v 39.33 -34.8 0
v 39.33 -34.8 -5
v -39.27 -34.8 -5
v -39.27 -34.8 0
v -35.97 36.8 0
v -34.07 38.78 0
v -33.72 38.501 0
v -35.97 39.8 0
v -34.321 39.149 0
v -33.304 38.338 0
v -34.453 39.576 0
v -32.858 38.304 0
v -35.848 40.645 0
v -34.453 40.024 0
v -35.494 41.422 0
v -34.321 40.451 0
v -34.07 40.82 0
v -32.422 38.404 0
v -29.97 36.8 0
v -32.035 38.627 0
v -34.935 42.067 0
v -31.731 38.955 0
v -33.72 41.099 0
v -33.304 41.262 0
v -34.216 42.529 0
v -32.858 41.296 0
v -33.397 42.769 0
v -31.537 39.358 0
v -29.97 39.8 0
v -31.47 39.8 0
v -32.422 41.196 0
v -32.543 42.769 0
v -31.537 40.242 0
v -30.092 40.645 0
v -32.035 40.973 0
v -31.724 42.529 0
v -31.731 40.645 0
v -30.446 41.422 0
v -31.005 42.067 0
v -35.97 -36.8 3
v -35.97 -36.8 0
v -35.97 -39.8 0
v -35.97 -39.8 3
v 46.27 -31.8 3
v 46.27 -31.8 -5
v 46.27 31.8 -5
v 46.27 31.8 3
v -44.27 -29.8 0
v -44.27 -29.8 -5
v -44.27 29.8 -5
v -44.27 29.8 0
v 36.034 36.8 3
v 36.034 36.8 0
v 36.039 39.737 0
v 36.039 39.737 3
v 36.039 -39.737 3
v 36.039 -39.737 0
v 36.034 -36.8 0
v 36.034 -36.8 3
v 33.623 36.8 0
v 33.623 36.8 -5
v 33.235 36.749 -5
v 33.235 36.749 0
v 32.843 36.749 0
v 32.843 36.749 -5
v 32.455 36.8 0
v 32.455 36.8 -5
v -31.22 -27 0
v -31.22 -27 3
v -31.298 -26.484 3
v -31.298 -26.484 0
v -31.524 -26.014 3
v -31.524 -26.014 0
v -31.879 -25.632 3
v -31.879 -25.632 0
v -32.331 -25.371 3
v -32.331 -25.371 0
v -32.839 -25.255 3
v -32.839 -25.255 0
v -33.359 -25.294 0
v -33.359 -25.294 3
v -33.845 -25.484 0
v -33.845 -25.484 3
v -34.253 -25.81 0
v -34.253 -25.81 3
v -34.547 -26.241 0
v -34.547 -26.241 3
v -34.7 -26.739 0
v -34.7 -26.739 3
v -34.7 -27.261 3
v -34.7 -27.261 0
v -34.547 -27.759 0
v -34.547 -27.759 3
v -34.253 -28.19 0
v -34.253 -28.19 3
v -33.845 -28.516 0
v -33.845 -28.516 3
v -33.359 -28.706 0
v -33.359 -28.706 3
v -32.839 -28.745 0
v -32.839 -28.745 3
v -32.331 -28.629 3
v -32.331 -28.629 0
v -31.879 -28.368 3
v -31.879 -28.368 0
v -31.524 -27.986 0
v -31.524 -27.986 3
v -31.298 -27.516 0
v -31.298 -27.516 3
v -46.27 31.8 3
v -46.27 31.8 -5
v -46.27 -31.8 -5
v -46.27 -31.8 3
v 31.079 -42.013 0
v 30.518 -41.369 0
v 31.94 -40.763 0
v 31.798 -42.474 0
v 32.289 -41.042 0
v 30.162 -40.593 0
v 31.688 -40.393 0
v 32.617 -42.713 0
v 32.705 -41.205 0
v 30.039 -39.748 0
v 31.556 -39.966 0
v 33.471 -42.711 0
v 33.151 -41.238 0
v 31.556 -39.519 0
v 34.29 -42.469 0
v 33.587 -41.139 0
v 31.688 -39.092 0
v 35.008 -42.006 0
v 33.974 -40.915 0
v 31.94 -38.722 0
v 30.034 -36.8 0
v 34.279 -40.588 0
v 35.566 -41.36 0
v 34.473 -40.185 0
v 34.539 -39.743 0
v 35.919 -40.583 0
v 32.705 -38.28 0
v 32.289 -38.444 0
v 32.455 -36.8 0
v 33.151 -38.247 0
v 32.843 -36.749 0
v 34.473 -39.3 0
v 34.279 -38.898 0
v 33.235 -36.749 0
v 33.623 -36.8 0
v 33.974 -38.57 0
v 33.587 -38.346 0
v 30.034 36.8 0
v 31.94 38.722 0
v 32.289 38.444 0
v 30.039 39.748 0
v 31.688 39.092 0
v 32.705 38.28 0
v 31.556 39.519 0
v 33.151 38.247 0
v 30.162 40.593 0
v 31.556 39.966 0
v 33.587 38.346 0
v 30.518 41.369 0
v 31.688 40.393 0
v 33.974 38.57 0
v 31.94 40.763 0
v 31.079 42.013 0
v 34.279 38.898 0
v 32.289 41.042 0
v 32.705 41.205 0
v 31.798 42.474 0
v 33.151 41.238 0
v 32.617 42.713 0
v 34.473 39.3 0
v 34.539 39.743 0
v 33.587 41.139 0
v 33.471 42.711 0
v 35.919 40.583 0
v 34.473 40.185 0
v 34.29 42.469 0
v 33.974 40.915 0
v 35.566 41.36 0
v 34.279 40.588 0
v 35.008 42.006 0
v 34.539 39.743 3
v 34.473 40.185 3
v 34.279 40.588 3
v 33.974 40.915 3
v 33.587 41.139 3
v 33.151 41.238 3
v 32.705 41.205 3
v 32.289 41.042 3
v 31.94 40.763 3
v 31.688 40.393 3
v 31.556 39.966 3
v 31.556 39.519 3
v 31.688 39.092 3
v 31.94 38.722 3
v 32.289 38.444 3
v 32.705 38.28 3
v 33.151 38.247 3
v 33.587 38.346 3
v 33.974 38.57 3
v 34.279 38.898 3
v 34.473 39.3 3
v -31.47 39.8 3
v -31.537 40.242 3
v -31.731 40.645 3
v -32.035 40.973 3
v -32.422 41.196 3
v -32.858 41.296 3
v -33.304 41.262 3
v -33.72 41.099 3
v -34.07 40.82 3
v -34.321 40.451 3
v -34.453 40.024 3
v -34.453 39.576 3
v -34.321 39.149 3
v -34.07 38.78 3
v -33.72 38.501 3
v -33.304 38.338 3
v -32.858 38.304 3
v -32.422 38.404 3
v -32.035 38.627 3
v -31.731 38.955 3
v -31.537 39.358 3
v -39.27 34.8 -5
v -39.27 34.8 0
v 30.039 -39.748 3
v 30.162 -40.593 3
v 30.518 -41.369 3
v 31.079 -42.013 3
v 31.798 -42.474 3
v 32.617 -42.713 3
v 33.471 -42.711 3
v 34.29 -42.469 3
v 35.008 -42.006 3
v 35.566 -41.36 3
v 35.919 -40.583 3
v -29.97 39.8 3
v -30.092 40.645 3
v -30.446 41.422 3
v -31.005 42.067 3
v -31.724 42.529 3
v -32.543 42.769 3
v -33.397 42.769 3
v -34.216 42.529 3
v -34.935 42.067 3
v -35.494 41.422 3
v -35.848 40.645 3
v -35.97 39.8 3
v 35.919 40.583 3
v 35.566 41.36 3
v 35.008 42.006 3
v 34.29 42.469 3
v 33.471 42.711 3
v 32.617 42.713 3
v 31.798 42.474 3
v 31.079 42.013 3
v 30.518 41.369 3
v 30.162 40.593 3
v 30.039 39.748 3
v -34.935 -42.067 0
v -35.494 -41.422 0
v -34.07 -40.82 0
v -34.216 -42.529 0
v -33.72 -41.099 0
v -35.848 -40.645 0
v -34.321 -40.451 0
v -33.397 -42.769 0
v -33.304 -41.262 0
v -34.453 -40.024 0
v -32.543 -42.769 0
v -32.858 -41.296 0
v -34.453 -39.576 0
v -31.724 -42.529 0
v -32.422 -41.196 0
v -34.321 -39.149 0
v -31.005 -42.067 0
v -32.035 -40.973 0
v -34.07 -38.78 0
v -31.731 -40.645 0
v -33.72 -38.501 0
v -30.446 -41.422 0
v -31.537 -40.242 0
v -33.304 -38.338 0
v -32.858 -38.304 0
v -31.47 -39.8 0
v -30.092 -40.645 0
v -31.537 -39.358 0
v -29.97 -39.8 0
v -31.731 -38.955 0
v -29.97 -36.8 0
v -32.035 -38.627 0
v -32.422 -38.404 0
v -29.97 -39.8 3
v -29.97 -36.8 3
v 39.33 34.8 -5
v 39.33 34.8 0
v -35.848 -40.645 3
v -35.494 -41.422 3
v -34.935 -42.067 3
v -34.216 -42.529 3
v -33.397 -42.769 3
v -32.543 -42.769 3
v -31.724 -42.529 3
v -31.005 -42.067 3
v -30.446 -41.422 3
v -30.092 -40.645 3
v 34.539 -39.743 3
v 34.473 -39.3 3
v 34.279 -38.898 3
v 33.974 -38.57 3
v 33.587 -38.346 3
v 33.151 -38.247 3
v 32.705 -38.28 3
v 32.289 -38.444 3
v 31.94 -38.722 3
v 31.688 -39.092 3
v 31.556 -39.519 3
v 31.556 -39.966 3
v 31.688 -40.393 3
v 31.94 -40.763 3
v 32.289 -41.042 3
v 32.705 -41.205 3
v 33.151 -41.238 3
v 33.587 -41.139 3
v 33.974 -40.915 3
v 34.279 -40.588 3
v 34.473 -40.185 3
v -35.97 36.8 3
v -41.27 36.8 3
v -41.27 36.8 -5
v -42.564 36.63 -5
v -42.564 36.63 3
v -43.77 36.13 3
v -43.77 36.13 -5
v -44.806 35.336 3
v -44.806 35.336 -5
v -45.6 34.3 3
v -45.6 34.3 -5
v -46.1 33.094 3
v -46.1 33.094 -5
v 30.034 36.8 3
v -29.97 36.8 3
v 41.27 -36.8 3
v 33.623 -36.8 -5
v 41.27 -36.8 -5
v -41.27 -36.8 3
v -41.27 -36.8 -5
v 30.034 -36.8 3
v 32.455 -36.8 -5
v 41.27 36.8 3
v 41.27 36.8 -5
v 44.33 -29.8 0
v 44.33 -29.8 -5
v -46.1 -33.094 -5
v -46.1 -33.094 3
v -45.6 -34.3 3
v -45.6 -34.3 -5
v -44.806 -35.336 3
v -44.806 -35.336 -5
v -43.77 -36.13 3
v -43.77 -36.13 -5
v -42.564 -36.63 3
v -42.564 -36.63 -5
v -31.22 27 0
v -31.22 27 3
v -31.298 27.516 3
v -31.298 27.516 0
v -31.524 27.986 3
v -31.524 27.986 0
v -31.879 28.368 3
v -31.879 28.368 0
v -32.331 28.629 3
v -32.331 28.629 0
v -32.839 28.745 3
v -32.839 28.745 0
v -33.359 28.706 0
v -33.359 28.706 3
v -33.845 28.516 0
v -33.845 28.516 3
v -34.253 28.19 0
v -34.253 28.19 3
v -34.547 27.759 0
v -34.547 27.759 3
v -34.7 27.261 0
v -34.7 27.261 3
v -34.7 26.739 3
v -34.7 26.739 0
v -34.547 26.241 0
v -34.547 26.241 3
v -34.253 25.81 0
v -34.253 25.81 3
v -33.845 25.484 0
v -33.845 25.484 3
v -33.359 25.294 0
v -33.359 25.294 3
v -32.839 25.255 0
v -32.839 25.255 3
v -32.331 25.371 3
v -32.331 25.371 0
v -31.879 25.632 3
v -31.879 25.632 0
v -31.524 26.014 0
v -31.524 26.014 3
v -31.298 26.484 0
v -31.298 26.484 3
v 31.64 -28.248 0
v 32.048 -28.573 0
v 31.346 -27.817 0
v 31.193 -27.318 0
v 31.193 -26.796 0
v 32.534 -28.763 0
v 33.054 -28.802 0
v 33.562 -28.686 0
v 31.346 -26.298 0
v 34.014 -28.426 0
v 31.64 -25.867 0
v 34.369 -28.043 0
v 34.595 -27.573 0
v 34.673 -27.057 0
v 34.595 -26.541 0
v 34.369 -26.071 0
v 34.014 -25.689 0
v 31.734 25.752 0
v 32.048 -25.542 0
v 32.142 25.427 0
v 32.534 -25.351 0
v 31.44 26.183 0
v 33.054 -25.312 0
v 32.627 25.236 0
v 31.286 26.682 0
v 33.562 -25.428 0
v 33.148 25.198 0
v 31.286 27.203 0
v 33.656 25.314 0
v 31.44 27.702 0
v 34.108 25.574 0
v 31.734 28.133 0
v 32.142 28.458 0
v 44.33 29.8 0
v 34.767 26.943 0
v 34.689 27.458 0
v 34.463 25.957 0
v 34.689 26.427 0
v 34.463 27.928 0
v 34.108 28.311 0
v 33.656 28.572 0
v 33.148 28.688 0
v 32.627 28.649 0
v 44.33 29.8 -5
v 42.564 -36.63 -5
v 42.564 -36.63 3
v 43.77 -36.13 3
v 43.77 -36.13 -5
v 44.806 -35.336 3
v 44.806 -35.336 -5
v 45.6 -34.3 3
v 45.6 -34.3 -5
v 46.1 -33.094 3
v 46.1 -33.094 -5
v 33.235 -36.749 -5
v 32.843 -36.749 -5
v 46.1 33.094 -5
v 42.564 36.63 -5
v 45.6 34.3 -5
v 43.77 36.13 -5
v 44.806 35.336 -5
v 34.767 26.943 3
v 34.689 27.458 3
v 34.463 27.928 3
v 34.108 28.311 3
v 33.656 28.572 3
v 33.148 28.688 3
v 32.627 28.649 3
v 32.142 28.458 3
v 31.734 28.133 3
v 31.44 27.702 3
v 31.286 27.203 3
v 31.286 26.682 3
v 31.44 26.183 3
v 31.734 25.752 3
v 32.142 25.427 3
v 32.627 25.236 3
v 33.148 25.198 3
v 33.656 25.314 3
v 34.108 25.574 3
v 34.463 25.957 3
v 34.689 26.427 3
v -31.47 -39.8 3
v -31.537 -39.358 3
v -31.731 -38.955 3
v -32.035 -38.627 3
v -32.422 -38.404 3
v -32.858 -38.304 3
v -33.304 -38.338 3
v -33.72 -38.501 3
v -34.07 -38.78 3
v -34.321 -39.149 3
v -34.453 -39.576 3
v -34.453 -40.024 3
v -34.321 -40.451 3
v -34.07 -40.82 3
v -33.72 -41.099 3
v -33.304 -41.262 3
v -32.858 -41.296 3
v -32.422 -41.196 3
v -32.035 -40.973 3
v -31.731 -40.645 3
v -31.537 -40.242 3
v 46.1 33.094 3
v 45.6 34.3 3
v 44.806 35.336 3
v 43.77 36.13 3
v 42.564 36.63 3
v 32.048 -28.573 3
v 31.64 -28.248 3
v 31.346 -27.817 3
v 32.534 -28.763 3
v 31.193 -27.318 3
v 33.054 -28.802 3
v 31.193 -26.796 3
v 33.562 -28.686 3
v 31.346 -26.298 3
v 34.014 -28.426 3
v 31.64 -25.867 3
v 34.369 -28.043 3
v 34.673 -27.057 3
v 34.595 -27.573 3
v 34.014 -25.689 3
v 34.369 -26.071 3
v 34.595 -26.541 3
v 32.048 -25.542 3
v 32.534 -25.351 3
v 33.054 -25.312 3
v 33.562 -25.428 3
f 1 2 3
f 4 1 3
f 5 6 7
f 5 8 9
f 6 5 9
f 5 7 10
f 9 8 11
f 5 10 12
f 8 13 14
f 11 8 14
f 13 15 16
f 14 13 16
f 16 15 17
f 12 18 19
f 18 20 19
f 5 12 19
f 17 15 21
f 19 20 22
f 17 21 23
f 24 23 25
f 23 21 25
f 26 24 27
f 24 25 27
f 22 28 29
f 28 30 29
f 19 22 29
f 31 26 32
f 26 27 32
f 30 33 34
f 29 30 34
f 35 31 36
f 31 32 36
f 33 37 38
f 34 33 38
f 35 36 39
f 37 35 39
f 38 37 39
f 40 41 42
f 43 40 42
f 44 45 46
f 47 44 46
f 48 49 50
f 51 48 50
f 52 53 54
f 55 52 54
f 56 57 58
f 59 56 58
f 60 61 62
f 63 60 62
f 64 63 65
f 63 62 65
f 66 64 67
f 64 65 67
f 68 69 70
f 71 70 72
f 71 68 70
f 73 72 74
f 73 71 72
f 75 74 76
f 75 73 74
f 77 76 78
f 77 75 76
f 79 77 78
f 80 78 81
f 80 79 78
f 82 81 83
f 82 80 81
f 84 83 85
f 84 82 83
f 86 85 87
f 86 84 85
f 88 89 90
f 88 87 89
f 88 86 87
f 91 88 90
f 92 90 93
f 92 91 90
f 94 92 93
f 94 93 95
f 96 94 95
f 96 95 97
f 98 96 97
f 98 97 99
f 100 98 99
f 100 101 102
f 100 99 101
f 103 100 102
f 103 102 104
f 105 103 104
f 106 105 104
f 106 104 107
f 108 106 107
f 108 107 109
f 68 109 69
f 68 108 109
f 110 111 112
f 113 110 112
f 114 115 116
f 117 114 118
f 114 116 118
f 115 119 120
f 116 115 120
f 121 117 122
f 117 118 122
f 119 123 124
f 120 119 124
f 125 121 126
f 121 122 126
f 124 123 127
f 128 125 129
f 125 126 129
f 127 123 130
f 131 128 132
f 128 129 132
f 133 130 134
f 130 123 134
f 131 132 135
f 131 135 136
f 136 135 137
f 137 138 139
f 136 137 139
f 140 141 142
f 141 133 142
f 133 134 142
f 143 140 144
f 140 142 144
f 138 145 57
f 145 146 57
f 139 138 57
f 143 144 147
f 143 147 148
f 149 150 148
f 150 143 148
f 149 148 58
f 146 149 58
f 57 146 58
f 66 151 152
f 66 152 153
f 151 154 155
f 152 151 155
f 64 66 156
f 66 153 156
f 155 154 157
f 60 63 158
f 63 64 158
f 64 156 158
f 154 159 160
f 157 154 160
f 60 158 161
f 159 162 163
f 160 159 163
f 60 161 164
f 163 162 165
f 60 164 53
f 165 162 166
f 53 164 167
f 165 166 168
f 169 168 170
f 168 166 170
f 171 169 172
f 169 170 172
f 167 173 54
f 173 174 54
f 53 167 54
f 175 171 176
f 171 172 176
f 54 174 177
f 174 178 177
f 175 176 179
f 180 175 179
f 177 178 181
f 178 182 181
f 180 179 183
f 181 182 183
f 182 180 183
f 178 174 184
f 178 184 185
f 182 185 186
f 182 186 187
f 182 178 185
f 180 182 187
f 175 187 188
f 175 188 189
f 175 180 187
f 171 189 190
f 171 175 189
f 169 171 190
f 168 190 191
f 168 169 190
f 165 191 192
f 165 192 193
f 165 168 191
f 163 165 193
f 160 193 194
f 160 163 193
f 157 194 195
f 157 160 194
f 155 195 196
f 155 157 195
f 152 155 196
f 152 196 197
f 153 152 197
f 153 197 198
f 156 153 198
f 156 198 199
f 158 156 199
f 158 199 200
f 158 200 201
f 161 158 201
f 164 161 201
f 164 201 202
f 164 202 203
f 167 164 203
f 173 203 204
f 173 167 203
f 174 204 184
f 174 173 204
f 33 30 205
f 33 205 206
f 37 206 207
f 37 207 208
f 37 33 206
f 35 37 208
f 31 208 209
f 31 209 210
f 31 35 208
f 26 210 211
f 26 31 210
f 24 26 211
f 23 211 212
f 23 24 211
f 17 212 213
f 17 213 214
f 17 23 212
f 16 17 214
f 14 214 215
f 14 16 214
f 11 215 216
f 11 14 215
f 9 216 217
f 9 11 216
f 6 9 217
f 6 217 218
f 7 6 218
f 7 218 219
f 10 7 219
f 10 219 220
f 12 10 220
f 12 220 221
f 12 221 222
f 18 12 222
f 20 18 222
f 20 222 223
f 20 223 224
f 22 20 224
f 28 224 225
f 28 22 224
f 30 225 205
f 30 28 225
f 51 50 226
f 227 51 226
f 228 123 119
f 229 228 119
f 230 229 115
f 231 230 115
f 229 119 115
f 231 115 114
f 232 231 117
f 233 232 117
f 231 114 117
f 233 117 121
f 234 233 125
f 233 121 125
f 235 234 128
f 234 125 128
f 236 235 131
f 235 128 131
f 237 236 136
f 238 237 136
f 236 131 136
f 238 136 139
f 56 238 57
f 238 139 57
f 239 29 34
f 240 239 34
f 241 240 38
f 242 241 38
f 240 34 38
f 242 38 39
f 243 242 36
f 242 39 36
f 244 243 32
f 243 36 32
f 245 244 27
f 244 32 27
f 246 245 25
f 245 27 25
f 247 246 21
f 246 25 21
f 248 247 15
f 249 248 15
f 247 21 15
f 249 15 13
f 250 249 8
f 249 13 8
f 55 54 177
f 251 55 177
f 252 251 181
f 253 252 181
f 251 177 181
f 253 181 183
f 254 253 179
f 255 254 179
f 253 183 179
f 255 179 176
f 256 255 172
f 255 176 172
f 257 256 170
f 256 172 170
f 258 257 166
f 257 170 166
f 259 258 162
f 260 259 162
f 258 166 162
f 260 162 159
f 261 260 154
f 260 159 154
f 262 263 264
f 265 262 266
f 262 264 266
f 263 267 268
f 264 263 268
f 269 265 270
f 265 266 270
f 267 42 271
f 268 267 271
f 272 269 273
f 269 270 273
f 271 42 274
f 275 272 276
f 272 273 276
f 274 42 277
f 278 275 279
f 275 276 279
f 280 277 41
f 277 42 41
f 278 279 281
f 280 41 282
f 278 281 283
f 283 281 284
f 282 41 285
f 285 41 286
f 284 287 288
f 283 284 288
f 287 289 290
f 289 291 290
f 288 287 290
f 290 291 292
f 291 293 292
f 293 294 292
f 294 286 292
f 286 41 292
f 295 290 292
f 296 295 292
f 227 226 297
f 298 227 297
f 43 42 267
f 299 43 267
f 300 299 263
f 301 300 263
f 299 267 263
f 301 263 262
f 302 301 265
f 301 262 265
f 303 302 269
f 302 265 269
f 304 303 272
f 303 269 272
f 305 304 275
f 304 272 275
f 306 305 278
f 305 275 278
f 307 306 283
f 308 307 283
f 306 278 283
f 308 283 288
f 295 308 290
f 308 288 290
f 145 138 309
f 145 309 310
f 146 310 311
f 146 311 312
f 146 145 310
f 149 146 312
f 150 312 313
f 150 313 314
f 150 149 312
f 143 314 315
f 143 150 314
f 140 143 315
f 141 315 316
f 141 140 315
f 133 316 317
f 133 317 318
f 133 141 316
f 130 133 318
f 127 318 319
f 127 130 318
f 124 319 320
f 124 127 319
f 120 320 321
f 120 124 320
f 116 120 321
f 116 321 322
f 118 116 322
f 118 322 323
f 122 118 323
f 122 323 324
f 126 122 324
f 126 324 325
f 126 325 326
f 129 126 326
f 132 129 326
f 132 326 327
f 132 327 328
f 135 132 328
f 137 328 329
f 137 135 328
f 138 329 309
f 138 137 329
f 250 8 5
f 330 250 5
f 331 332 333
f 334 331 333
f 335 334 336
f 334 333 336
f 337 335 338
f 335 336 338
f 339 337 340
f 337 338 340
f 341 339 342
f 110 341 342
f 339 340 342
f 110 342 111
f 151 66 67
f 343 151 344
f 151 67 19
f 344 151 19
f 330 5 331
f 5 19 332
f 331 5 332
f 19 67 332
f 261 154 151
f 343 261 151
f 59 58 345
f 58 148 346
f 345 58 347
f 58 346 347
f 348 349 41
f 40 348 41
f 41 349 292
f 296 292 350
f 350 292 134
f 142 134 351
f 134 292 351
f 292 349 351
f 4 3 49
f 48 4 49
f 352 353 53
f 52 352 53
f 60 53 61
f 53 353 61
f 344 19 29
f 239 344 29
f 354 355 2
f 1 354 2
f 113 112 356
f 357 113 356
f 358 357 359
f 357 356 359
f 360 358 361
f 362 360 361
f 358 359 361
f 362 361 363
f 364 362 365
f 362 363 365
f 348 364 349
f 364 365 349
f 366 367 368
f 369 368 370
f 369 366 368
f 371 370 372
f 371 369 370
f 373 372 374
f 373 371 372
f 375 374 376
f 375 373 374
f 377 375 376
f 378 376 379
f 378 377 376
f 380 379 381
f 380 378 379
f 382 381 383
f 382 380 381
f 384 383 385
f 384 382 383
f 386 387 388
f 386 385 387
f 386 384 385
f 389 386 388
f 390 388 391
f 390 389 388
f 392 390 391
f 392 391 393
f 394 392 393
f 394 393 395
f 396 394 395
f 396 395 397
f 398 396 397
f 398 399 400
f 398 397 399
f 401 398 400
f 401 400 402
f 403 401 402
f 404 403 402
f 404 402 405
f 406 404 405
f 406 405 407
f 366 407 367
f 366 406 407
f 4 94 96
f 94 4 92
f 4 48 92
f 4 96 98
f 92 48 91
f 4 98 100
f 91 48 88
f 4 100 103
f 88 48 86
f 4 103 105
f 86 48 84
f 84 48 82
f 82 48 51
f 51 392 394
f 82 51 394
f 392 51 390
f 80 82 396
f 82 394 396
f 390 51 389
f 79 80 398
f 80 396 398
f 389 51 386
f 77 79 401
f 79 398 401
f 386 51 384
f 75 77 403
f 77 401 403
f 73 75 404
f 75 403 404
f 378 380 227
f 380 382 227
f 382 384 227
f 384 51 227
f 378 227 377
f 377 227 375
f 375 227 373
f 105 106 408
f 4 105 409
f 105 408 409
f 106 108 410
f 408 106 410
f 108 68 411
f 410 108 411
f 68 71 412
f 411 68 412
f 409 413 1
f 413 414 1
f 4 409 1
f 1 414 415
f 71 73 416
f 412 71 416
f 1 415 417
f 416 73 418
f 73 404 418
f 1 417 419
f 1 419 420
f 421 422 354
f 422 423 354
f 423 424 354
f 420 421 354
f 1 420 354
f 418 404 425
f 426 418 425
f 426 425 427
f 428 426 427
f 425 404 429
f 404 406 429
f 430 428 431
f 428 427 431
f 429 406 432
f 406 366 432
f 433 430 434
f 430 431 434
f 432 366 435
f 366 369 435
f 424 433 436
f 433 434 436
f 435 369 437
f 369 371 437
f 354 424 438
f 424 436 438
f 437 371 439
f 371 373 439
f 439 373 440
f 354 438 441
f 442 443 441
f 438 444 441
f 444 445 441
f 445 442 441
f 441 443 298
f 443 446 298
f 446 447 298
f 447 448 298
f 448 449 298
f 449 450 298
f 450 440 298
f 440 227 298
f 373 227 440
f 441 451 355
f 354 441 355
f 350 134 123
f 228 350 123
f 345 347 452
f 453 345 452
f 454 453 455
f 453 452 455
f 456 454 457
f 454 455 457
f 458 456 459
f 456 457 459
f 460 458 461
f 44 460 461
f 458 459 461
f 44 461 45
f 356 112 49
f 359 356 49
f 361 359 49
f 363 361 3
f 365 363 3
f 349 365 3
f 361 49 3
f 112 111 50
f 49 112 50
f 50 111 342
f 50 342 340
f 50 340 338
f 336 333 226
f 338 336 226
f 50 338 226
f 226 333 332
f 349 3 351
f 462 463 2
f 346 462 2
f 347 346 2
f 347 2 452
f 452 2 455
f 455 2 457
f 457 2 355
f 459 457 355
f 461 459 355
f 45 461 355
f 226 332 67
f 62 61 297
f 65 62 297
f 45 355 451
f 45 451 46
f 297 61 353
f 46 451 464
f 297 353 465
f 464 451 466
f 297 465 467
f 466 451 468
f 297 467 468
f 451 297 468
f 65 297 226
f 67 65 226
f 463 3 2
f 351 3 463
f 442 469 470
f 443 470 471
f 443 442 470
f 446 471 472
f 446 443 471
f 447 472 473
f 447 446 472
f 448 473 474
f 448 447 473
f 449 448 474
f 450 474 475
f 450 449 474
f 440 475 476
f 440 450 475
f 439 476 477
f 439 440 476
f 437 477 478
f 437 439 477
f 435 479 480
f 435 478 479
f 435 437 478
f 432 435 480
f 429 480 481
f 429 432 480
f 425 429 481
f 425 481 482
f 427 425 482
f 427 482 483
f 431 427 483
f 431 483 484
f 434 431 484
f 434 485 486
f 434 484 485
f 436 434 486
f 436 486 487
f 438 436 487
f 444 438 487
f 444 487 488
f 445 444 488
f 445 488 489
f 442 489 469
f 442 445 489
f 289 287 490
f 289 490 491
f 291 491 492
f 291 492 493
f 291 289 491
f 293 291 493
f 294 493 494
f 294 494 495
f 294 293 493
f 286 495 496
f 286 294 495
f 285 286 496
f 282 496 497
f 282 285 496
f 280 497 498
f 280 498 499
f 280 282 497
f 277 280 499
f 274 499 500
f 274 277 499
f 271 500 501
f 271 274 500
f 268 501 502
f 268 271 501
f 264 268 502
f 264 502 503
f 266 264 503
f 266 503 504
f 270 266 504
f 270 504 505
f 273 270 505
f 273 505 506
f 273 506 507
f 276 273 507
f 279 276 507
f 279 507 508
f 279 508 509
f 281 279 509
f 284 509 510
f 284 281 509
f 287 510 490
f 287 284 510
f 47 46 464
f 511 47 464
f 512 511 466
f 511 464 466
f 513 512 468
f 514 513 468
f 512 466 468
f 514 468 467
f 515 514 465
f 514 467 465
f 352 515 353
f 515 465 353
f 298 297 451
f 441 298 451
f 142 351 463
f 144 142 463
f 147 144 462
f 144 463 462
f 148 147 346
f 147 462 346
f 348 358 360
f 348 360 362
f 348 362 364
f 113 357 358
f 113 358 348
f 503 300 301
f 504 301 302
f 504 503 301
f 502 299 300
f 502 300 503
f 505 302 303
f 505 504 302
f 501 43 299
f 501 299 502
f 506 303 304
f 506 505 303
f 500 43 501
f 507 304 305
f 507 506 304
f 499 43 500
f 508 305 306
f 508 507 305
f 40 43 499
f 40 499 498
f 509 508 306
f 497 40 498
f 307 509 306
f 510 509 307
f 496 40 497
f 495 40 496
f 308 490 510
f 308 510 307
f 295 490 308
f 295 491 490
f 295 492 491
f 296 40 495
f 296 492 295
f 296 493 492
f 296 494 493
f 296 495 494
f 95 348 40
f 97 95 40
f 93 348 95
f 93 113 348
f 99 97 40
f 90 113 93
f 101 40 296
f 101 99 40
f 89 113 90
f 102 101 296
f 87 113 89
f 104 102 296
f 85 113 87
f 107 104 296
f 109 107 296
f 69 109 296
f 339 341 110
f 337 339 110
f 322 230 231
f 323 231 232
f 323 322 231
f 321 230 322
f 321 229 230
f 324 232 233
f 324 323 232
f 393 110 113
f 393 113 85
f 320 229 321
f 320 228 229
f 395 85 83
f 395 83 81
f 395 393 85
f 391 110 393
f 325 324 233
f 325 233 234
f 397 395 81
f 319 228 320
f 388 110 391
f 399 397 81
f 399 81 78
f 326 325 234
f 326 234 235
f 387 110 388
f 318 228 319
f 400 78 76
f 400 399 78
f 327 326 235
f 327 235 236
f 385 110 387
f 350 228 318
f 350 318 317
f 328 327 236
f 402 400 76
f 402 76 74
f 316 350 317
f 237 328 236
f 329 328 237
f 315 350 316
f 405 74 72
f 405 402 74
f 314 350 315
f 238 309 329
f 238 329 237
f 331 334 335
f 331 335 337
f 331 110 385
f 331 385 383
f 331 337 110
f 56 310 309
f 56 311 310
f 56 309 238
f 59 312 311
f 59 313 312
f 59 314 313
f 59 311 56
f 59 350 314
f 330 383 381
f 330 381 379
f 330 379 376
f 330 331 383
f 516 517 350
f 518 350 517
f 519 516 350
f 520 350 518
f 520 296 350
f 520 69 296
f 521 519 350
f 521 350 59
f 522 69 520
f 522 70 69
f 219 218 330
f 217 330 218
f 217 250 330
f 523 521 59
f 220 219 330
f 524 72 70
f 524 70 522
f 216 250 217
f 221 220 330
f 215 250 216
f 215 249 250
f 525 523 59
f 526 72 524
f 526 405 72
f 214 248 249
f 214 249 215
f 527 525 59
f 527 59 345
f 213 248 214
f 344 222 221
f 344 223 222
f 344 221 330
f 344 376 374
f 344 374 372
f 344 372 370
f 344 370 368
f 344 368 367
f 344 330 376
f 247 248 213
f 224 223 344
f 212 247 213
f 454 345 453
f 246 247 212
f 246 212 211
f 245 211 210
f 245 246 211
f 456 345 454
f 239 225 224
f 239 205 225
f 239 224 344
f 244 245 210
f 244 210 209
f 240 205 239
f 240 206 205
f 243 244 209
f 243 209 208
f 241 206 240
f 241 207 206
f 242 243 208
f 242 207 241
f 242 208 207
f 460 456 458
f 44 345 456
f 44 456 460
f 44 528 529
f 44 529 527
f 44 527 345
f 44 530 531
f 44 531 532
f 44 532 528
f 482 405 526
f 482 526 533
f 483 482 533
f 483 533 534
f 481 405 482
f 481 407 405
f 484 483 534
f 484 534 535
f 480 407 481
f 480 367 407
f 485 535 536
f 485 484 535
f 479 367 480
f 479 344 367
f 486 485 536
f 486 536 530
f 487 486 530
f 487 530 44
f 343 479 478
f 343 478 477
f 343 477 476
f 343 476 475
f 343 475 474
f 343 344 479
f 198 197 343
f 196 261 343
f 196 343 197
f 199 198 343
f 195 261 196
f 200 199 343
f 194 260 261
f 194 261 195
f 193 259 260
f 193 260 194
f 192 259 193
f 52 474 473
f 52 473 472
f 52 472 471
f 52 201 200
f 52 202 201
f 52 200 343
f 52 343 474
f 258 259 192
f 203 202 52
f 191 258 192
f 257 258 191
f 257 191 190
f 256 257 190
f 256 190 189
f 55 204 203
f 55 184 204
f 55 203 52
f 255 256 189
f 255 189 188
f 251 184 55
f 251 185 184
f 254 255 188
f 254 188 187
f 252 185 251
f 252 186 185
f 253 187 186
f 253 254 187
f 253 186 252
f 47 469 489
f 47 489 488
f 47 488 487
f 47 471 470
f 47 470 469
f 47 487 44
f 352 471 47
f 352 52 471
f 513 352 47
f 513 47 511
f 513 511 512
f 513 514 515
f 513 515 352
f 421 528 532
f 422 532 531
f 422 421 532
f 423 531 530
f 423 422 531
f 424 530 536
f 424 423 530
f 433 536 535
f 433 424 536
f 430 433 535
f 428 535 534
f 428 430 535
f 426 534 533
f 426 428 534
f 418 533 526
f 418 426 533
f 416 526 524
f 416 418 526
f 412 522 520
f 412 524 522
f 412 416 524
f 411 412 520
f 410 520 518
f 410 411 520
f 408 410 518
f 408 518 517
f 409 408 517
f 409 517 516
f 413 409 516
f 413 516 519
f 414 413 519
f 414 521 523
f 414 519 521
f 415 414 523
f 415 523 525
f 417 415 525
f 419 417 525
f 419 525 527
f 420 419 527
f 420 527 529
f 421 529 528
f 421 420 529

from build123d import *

# Parameters (mm, degrees)
DRAFT_2_R           = 1.5
EXTRUDE_1_DEPTH     = 3
EXTRUDE_START       = -5
EXTRUDE_2_DEPTH     = 5
DRAFT_6_R           = 1.75
CUT_EXTRUDE_7_DEPTH = 64.227785822


with BuildPart() as part:
    # draft 2 → Extrude 1 (new body)
    with BuildSketch(Plane.XY):
        with BuildLine():
            Line((41.27, 36.8), (36.034054446, 36.8))
            Line((36.034054446, 36.8), (36.039162942, 39.737383337))
            ThreePointArc((36.039162942, 39.737383337), (33.044384867, 42.742596187), (30.039172016, 39.747818111))
            Line((30.039172016, 39.747818111), (30.034045372, 36.8))
            Line((30.034045372, 36.8), (-29.97, 36.8))
            Line((-29.97, 36.8), (-29.97, 39.8))
            ThreePointArc((-29.97, 39.8), (-32.97, 42.8), (-35.97, 39.8))
            Line((-35.97, 39.8), (-35.97, 36.8))
            Line((-35.97, 36.8), (-41.27, 36.8))
            ThreePointArc((-41.27, 36.8), (-44.805533906, 35.335533906), (-46.27, 31.8))
            Line((-46.27, 31.8), (-46.27, -31.8))
            ThreePointArc((-46.27, -31.8), (-44.805533906, -35.335533906), (-41.27, -36.8))
            Line((-41.27, -36.8), (-35.97, -36.8))
            Line((-35.97, -36.8), (-35.97, -39.8))
            ThreePointArc((-35.97, -39.8), (-32.97, -42.8), (-29.97, -39.8))
            Line((-29.97, -39.8), (-29.97, -36.8))
            Line((-29.97, -36.8), (30.034045372, -36.8))
            Line((30.034045372, -36.8), (30.039172016, -39.747818111))
            ThreePointArc((30.039172016, -39.747818111), (33.044384867, -42.742596187), (36.039162942, -39.737383337))
            Line((36.039162942, -39.737383337), (36.034054446, -36.8))
            Line((36.034054446, -36.8), (41.27, -36.8))
            ThreePointArc((41.27, -36.8), (44.805533906, -35.335533906), (46.27, -31.8))
            Line((46.27, -31.8), (46.27, 31.8))
            ThreePointArc((46.27, 31.8), (44.805533906, 35.335533906), (41.27, 36.8))
        make_face()
        with Locations((-32.97, -39.8)):
            Circle(DRAFT_2_R, mode=Mode.SUBTRACT)
        with Locations((33.039167479, -39.742600724)):
            Circle(DRAFT_2_R, mode=Mode.SUBTRACT)
        with Locations((-32.97, 39.8)):
            Circle(DRAFT_2_R, mode=Mode.SUBTRACT)
        with Locations((33.039167479, 39.742600724)):
            Circle(DRAFT_2_R, mode=Mode.SUBTRACT)
    extrude(amount=EXTRUDE_1_DEPTH)

    # draft_5 → Extrude 2 (add)
    with BuildSketch(Plane.XY.offset(EXTRUDE_START)):
        with BuildLine():
            ThreePointArc((-46.27, -31.8), (-44.805533906, -35.335533906), (-41.27, -36.8))
            Line((-41.27, -36.8), (-35.97, -36.8))
            Line((-35.97, -36.8), (-32.97, -36.8))
            Line((-32.97, -36.8), (-29.97, -36.8))
            Line((-29.97, -36.8), (30.034045372, -36.8))
            Line((30.034045372, -36.8), (32.455128971, -36.8))
            ThreePointArc((32.455128971, -36.8), (33.039167479, -36.742600724), (33.623205988, -36.8))
            Line((33.623205988, -36.8), (36.034054446, -36.8))
            Line((36.034054446, -36.8), (41.27, -36.8))
            ThreePointArc((41.27, -36.8), (44.805533906, -35.335533906), (46.27, -31.8))
            Line((46.27, -31.8), (46.27, 31.8))
            ThreePointArc((46.27, 31.8), (44.805533906, 35.335533906), (41.27, 36.8))
            Line((41.27, 36.8), (36.034054446, 36.8))
            Line((36.034054446, 36.8), (33.623205988, 36.8))
            ThreePointArc((33.623205988, 36.8), (33.039167479, 36.742600724), (32.455128971, 36.8))
            Line((32.455128971, 36.8), (30.034045372, 36.8))
            Line((30.034045372, 36.8), (-29.97, 36.8))
            Line((-29.97, 36.8), (-32.97, 36.8))
            Line((-32.97, 36.8), (-35.97, 36.8))
            Line((-35.97, 36.8), (-41.27, 36.8))
            ThreePointArc((-41.27, 36.8), (-44.805533906, 35.335533906), (-46.27, 31.8))
            Line((-46.27, 31.8), (-46.27, -31.8))
        make_face()
        Polygon((-44.27, 29.8), (-39.27, 34.8), (39.33, 34.8), (44.33, 29.8), (44.33, -29.8), (39.33, -34.8), (-39.27, -34.8), (-44.27, -29.8), align=None, mode=Mode.SUBTRACT)
    extrude(amount=EXTRUDE_2_DEPTH)

    # draft_6 → Cut-Extrude 7 (cut, through all)
    with BuildSketch(Plane.XY):
        with Locations((-32.97, 27)):
            Circle(DRAFT_6_R)
        with Locations((-32.97, -27)):
            Circle(DRAFT_6_R)
        with Locations((32.922993654, -27.057298255)):
            Circle(DRAFT_6_R)
        with Locations((33.016906626, 26.942620081)):
            Circle(DRAFT_6_R)
    extrude(amount=CUT_EXTRUDE_7_DEPTH, mode=Mode.SUBTRACT)


solid = part.part
